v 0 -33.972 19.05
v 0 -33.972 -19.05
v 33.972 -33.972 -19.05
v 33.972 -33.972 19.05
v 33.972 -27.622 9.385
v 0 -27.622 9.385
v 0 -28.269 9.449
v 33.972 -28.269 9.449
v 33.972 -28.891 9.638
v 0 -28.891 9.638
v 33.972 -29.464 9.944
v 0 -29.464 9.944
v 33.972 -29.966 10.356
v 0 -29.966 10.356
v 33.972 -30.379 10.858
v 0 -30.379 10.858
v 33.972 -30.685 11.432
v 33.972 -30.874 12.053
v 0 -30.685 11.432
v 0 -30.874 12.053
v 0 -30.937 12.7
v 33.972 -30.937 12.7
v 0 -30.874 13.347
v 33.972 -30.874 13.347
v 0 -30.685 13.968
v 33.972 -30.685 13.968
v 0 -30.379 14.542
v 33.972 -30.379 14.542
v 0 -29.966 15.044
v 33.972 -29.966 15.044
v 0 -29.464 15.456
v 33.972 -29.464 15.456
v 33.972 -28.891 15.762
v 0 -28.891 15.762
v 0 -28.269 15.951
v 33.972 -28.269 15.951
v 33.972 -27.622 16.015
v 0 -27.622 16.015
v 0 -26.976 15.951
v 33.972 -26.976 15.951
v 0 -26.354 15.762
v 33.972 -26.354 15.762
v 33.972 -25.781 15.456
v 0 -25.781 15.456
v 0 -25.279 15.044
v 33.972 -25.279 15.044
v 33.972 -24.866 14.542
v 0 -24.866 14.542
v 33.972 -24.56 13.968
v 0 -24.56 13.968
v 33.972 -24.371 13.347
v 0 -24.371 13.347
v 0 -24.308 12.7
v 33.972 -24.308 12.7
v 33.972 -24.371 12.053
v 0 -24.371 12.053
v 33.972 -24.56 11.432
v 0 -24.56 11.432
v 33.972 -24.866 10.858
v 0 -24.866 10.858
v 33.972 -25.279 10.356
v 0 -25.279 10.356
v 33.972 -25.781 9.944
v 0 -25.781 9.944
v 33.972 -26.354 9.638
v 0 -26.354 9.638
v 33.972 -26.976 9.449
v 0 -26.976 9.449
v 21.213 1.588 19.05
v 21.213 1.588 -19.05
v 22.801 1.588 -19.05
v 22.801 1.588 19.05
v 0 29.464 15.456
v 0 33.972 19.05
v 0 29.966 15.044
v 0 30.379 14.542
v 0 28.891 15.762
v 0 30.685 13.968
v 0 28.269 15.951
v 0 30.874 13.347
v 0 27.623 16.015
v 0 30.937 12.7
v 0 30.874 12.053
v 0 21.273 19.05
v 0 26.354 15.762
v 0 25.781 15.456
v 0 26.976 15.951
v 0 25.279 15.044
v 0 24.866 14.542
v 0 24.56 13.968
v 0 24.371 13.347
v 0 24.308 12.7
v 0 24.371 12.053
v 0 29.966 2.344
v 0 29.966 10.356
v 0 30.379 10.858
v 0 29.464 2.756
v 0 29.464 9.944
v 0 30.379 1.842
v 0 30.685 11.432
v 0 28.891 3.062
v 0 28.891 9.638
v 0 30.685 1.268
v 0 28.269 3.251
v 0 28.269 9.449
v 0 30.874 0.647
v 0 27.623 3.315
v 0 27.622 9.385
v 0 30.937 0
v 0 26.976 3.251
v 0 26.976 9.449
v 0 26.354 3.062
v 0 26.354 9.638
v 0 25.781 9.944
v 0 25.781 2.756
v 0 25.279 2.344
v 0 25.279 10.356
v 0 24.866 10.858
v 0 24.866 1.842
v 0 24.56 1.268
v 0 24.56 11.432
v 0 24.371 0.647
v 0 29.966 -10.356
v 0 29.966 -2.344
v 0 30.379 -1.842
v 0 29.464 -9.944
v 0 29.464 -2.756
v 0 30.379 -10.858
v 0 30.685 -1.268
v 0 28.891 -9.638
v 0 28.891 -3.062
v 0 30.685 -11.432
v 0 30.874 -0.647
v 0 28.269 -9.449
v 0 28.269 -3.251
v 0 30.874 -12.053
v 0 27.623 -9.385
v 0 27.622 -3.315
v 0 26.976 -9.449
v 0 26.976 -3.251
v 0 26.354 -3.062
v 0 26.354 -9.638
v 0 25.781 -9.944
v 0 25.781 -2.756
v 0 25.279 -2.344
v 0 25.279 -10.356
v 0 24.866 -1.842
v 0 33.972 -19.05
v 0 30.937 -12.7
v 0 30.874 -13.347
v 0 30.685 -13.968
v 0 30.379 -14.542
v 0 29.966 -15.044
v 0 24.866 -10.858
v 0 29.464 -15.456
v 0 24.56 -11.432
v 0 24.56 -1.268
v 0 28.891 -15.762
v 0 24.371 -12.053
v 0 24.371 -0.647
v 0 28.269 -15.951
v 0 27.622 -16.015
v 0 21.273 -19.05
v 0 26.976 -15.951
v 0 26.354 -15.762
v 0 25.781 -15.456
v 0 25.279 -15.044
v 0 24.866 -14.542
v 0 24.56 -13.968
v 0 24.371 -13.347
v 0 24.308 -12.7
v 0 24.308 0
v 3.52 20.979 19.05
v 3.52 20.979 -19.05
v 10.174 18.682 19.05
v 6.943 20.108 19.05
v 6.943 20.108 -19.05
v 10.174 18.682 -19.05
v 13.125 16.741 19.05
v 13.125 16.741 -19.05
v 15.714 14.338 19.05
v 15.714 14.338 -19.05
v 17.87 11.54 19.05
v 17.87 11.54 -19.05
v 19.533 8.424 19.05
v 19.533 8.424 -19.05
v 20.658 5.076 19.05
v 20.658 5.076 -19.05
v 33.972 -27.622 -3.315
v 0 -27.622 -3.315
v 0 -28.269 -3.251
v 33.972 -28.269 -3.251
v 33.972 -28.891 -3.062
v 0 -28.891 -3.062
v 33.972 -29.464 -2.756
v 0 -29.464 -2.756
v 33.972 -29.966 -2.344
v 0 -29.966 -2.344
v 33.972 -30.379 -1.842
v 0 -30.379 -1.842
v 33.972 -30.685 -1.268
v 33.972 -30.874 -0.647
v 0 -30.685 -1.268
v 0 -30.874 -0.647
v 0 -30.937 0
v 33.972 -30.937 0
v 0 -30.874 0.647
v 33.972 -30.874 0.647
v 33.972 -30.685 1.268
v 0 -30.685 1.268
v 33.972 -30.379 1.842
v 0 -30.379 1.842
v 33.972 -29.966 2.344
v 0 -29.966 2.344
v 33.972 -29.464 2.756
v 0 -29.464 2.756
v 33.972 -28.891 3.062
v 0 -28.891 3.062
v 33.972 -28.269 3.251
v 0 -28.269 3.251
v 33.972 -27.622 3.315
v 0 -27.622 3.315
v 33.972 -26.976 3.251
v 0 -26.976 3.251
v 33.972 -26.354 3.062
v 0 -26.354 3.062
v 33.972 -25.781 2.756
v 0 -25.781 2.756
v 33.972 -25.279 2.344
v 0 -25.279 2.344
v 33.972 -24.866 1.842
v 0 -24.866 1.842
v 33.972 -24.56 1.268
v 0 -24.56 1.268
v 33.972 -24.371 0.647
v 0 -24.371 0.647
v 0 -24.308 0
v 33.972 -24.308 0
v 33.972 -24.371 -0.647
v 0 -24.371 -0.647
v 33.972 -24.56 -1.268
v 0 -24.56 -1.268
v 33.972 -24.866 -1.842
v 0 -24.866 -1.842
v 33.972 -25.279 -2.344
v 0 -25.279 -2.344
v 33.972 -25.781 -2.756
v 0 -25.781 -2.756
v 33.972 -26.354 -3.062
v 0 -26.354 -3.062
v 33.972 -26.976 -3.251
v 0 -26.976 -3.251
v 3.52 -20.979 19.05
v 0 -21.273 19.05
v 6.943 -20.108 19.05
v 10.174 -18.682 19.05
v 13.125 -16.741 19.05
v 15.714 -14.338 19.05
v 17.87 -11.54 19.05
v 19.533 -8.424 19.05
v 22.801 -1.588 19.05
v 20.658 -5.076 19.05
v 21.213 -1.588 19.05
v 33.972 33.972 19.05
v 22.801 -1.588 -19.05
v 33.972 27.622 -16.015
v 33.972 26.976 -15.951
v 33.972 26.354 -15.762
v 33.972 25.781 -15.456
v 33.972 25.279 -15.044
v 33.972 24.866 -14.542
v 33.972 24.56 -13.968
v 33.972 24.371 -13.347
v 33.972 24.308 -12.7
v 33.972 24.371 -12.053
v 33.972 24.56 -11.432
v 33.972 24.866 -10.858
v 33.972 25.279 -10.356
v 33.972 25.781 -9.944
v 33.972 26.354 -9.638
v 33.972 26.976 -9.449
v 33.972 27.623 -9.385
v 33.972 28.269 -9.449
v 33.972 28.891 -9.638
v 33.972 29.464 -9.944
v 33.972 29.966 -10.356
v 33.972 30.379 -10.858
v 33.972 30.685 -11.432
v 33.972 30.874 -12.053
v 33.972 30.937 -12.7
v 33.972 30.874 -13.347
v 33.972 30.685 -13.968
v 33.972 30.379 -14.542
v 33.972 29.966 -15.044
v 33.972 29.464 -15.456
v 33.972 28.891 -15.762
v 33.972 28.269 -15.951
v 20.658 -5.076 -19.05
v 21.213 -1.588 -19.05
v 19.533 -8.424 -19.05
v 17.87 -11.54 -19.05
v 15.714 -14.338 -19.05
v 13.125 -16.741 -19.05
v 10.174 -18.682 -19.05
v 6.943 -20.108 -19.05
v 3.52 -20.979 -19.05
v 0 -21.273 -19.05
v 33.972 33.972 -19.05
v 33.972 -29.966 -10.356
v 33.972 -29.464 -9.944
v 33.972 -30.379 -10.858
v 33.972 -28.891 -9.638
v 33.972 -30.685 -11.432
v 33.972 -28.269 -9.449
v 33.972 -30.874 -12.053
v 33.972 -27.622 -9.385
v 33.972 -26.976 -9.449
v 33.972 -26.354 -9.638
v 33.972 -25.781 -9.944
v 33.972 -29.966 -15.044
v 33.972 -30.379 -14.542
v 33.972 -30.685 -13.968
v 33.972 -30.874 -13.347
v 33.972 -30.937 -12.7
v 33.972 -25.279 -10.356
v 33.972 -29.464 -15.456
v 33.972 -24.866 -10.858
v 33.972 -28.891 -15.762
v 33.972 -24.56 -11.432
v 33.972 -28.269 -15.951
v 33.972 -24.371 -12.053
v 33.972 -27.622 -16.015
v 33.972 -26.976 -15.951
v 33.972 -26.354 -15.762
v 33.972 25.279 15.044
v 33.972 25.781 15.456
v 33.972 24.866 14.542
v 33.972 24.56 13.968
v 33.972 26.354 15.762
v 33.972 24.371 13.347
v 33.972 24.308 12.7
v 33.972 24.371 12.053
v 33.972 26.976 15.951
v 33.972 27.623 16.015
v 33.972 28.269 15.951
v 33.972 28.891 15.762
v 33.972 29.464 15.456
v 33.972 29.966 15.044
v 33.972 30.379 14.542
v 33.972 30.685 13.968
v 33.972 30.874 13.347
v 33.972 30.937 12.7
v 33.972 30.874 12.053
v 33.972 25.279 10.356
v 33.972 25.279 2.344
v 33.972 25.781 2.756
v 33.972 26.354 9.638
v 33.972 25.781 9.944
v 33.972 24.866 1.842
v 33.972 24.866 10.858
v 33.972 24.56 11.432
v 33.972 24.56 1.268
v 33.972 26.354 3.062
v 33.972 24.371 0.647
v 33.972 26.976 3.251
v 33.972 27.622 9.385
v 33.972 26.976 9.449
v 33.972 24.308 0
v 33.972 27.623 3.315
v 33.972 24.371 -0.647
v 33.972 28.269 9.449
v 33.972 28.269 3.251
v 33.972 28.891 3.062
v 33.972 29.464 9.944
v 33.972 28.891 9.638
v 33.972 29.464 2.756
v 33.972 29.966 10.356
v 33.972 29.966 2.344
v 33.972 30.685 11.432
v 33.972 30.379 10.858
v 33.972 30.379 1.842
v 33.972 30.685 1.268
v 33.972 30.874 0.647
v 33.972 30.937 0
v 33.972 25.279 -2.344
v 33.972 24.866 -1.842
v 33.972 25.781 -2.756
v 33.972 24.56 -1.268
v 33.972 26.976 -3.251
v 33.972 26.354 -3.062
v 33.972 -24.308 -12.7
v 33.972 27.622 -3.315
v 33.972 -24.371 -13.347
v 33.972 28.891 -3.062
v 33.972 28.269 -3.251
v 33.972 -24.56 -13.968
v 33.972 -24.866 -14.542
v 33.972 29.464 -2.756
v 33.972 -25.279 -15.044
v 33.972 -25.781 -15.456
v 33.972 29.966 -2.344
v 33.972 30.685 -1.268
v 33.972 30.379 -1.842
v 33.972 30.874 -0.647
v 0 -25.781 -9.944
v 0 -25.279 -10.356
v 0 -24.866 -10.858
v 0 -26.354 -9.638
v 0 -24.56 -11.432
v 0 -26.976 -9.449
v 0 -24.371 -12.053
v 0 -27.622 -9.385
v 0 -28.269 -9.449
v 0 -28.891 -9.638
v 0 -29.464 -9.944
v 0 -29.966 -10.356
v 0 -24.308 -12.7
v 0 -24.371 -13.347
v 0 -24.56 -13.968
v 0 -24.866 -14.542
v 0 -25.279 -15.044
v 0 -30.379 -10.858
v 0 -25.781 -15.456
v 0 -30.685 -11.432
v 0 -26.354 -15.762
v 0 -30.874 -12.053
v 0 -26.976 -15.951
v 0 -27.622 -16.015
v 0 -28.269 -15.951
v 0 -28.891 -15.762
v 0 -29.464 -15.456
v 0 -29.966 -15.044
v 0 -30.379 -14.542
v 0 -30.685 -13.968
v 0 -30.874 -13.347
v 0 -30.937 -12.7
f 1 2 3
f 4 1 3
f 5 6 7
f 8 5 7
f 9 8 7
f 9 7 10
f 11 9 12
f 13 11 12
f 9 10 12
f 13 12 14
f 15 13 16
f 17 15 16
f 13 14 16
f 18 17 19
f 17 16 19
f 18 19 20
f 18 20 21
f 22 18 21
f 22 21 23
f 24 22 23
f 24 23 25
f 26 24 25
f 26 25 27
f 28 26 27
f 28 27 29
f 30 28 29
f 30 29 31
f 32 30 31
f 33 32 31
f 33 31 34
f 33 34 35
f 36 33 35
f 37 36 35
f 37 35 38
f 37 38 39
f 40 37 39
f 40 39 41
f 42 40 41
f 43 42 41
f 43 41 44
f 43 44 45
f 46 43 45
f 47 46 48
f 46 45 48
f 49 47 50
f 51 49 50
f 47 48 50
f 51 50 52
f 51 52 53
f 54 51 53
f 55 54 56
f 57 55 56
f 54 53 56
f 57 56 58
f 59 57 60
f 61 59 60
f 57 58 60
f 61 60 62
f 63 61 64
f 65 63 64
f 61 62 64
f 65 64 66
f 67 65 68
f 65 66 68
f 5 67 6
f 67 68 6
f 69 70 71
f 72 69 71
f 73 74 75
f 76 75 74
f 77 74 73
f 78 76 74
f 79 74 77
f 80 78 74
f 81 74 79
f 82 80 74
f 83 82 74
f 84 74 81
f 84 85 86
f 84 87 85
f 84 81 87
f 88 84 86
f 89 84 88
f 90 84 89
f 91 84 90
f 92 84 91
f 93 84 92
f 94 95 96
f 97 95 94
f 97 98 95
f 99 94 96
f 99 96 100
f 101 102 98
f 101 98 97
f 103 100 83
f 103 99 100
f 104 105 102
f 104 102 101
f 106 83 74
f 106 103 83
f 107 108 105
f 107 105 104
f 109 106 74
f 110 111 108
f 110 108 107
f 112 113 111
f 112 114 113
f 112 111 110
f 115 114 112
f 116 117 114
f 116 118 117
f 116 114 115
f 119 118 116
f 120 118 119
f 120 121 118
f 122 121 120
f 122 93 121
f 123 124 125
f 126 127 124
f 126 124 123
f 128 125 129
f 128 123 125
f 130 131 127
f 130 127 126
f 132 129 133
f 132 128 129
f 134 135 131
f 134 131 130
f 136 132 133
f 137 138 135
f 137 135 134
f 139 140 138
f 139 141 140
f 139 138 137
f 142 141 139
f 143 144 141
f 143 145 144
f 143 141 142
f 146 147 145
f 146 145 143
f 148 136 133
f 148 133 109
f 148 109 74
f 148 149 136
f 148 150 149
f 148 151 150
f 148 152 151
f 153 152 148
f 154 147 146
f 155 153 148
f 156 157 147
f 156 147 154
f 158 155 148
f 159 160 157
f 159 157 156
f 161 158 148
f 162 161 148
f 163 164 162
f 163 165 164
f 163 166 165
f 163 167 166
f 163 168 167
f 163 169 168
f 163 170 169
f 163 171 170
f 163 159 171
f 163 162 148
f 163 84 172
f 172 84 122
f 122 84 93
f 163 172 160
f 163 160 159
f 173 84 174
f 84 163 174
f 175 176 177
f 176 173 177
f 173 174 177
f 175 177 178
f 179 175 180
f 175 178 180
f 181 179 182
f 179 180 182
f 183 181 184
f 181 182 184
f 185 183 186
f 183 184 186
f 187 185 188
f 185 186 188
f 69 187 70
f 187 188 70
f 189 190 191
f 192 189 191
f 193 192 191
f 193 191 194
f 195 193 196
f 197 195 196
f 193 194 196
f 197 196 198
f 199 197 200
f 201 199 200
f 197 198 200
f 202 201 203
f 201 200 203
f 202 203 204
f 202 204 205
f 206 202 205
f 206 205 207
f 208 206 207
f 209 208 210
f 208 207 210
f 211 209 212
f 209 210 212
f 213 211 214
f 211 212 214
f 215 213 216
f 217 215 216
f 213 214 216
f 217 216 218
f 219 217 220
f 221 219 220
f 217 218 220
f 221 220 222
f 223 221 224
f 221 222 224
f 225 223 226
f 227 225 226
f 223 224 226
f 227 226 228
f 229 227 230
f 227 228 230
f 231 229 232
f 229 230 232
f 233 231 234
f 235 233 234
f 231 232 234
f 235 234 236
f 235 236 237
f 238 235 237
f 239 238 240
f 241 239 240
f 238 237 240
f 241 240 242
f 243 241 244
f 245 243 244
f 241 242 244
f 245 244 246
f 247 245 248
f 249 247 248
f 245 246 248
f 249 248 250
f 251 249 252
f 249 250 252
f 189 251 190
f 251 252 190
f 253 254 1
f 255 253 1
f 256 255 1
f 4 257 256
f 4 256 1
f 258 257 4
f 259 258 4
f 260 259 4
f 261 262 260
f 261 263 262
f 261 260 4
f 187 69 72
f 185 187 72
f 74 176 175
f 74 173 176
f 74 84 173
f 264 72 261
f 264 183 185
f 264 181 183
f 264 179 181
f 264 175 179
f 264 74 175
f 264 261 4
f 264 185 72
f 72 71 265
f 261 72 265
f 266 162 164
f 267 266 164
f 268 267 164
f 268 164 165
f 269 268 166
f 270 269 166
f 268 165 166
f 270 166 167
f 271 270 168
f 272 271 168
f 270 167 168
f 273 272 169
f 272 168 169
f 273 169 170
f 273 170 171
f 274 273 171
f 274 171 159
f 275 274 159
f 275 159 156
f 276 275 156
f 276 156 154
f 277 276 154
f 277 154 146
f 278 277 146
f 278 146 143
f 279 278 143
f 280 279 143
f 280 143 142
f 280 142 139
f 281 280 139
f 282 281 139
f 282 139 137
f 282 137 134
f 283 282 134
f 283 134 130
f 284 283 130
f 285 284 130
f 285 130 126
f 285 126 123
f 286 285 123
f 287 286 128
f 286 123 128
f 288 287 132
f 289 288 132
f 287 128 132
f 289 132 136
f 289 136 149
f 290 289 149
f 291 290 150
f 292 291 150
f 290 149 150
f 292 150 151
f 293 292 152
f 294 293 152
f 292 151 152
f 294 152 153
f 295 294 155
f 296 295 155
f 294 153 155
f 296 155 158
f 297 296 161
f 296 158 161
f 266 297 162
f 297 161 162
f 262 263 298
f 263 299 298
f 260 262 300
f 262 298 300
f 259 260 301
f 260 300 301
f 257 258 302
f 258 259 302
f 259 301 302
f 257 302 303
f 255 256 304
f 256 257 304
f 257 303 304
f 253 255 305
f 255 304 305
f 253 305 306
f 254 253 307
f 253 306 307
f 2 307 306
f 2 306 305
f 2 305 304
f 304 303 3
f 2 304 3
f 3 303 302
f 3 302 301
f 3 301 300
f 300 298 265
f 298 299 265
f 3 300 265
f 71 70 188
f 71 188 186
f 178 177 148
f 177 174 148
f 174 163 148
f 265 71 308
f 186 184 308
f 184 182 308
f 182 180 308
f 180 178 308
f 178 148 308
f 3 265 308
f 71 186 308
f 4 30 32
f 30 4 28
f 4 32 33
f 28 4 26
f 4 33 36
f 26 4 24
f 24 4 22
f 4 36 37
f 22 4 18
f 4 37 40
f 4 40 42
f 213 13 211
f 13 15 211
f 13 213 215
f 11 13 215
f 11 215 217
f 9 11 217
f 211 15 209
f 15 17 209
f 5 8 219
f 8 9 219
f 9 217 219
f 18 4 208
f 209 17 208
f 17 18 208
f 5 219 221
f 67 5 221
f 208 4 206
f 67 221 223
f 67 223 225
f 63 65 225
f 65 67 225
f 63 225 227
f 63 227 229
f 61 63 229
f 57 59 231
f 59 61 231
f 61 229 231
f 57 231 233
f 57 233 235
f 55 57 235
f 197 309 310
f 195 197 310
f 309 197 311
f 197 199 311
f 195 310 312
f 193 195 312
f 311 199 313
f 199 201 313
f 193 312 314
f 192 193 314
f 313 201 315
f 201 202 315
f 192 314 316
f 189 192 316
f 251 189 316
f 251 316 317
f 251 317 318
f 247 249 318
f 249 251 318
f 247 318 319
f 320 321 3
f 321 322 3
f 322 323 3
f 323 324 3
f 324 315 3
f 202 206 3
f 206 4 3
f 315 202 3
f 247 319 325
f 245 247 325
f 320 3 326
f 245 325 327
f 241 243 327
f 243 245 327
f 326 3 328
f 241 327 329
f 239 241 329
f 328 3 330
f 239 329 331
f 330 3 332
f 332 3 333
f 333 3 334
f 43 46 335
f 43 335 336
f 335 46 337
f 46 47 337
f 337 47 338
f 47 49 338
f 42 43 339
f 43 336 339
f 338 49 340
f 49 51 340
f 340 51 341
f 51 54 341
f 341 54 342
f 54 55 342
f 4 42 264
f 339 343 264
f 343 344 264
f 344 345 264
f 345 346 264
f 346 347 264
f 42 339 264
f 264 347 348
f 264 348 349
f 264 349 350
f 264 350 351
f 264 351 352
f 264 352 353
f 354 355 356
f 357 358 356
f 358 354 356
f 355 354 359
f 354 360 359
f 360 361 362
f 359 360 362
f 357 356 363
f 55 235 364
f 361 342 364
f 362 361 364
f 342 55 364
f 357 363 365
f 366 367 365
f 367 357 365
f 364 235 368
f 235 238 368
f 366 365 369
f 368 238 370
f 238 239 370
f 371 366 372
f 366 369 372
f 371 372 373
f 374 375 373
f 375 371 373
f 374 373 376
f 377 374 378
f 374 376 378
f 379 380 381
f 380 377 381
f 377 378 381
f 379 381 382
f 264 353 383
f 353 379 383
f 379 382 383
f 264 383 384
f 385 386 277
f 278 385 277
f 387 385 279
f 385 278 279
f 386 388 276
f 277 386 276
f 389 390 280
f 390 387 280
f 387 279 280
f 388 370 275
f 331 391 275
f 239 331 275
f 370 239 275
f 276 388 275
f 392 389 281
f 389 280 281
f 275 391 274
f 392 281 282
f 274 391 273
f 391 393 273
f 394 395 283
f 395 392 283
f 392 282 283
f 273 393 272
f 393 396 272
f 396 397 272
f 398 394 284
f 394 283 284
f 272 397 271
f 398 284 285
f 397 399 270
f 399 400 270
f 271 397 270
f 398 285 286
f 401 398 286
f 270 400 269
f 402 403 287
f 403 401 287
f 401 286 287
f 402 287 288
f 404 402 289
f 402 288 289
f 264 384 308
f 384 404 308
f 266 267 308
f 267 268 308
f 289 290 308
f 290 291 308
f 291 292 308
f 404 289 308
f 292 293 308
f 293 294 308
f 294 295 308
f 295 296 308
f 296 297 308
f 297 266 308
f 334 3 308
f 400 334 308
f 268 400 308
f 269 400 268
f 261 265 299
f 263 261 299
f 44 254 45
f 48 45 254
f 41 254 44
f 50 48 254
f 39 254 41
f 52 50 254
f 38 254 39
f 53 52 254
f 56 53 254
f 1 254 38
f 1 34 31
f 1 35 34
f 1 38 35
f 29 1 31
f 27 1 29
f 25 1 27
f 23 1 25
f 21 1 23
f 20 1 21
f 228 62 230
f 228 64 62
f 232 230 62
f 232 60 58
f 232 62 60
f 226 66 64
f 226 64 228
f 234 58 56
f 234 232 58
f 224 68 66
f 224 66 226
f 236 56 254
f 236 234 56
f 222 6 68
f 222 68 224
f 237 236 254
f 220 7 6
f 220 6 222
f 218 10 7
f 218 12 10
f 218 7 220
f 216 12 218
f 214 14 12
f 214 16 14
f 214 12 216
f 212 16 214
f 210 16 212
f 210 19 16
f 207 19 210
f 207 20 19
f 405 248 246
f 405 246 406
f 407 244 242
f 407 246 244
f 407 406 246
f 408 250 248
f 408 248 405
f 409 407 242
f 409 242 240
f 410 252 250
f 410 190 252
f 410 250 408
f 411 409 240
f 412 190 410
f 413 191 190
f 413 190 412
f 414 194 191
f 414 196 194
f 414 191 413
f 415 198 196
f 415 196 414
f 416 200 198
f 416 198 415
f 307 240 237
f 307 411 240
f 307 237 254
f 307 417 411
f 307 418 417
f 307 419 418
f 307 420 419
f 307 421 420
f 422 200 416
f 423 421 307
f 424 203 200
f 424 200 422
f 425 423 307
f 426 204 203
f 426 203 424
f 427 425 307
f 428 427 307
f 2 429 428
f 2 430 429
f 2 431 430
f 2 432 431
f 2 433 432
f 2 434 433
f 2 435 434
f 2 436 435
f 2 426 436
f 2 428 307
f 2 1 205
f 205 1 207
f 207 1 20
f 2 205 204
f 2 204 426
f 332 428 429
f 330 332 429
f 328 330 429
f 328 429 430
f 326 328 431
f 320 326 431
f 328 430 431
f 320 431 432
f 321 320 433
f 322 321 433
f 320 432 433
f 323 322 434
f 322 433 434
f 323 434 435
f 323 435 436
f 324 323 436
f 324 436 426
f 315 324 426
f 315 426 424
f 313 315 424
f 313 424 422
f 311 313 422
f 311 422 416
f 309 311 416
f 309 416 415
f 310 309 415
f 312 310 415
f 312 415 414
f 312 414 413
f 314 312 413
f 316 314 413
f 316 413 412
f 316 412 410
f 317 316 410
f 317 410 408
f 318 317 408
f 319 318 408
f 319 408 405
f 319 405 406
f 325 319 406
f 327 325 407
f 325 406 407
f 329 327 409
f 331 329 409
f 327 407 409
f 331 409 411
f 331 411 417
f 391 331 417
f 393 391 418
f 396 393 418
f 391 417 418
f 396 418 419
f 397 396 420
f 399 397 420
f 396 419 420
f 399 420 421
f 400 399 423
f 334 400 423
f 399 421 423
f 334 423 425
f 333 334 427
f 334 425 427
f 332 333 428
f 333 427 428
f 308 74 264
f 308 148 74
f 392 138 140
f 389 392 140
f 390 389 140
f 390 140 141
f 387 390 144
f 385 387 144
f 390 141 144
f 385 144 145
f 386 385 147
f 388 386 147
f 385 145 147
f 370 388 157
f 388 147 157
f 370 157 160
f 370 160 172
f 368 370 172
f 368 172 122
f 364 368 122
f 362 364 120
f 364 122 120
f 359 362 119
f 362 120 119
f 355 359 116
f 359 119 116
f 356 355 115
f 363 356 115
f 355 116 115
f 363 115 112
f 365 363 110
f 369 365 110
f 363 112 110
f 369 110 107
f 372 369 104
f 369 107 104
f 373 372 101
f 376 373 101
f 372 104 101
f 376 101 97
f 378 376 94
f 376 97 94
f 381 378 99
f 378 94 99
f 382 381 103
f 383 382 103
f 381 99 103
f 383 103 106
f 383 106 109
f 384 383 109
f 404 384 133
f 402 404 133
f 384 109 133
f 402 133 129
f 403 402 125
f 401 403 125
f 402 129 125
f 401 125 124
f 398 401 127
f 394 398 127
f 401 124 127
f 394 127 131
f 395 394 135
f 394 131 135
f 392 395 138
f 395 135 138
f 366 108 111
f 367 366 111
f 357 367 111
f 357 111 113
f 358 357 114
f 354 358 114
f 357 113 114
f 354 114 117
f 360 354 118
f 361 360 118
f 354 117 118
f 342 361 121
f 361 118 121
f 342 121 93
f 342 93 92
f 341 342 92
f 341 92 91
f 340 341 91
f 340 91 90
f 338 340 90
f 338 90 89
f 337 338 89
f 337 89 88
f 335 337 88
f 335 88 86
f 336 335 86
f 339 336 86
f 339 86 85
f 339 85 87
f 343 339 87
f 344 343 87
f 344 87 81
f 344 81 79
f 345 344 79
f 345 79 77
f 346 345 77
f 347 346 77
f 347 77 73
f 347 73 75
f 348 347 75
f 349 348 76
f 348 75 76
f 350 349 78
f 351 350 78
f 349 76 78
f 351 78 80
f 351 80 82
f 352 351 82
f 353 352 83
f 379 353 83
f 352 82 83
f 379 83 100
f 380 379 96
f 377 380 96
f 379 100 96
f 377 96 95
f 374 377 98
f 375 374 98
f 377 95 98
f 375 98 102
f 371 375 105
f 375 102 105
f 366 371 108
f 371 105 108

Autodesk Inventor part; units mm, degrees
ref_plane "YZ Plane" through (0, 0, 0) normal (1, 0, 0) x (0, 1, 0)
ref_plane "XZ Plane" through (0, 0, 0) normal (0, 1, 0) x (-1, 0, 0)
ref_plane "XY Plane" through (0, 0, 0) normal (0, 0, 1) x (1, 0, 0)
sketch "Sketch1" plane through (0, 0, 0) normal (0, 0, 1) x (1, 0, 0)
  arc A0 (21.2132, 1.5875) -> (21.2132, -1.5875) centre (0, 0) ccw
  arc A1 (0, 33.9725) -> (-33.9725, 0) centre (0, 0) ccw
  line L0 (0, -33.9725) -> (-33.9725, -33.9725)
  line L1 (-33.9725, 0) -> (-33.9725, -33.9725)
  line L2 (0, 33.9725) -> (33.9725, 33.9725)
  line L3 (0, -33.9725) -> (33.9725, -33.9725)
  line L4 (33.9725, 0) -> (33.9725, -33.9725)
  line L5 (33.9725, 0) -> (33.9725, 33.9725)
  line L6 (0, 0) -> (24.13, 0) construction
  line L7 (21.2132, 1.5875) -> (22.8007, 1.5875)
  line L8 (22.8007, 1.5875) -> (22.8007, -1.5875)
  line L9 (22.8007, -1.5875) -> (21.2132, -1.5875)
  dimension "d0" = 42.545
  dimension "d1" = 67.945
  dimension "d22" = 1.5875
  dimension "d23" = 1.5875
  dimension "d24" = 1.5875
extrude "Extrusion1" add sketch "Sketch1" along normal mid plane 38.1
sketch "Sketch2" plane through (-33.9725, -33.9725, 19.05) normal (-1, 0, 0) x (0, 0, 1)
  line L0 (0, 0) -> (-38.1, 0) construction
  line L1 (-19.05, 0) -> (-19.05, 33.9725) construction
  point P0 (-19.05, 10.16)
  dimension "d4" = 10.16
hole "Hole1" at (-33.9725, -23.8125, 0) direction (1, 0, 0) diameter 4.9784 depth 31.75 tip angle 118 thread size "1/4-20 UNC" class "2B" standard "ANSI Unified Screw Threads"
sketch "Sketch3" plane through (33.9725, -33.9725, 19.05) normal (1, 0, 0) x (0, 0, -1)
  line L0 (0, 67.945) -> (38.1, 67.945) construction
  line L1 (19.05, 67.945) -> (19.05, 0) construction
  line L2 (0, 0) -> (38.1, 0) construction
  line L3 (6.35, 67.945) -> (6.35, 0) construction
  line L4 (31.75, 67.945) -> (31.75, 0) construction
  line L5 (0, 0) -> (0, 67.945) construction
  line L6 (38.1, 67.945) -> (38.1, 0) construction
  point P0 (19.05, 33.9725)
  point P1 (19.05, 61.595)
  point P2 (19.05, 6.35)
  point P3 (6.35, 61.595)
  point P4 (31.75, 61.595)
  point P5 (31.75, 6.35)
  point P6 (6.35, 6.35)
  dimension "d13" = 6.35
  dimension "d14" = 6.35
  dimension "d25" = 6.35
  dimension "d26" = 6.35
  dimension "d27" = 6.35
  dimension "d28" = 6.35
  dimension "d29" = 6.35
split "Split1" plane through (0, 0, 0) removes the side toward (-1, 0, 0)
hole "Hole2" at (33.9725, 27.6225, 0) at (33.9725, -27.6225, 0) at (33.9725, 27.6225, 12.7) at (33.9725, 27.6225, -12.7) at (33.9725, -27.6225, -12.7) at (33.9725, -27.6225, 12.7) direction (-1, 0, 0) diameter 6.6294 end through all
equation "\"d0\" = pipeDiameter"
equation "\"d1\" = pipeDiameter + 2 * outerRadius"
equation "\"d2\" = width"
equation "\"pipeDiameter\" = 42.545"
equation "\"outerRadius\" = 12.7"
equation "\"width\" = 38.1"
properties part number "gripperBracketB" material "Aluminum 6061"
